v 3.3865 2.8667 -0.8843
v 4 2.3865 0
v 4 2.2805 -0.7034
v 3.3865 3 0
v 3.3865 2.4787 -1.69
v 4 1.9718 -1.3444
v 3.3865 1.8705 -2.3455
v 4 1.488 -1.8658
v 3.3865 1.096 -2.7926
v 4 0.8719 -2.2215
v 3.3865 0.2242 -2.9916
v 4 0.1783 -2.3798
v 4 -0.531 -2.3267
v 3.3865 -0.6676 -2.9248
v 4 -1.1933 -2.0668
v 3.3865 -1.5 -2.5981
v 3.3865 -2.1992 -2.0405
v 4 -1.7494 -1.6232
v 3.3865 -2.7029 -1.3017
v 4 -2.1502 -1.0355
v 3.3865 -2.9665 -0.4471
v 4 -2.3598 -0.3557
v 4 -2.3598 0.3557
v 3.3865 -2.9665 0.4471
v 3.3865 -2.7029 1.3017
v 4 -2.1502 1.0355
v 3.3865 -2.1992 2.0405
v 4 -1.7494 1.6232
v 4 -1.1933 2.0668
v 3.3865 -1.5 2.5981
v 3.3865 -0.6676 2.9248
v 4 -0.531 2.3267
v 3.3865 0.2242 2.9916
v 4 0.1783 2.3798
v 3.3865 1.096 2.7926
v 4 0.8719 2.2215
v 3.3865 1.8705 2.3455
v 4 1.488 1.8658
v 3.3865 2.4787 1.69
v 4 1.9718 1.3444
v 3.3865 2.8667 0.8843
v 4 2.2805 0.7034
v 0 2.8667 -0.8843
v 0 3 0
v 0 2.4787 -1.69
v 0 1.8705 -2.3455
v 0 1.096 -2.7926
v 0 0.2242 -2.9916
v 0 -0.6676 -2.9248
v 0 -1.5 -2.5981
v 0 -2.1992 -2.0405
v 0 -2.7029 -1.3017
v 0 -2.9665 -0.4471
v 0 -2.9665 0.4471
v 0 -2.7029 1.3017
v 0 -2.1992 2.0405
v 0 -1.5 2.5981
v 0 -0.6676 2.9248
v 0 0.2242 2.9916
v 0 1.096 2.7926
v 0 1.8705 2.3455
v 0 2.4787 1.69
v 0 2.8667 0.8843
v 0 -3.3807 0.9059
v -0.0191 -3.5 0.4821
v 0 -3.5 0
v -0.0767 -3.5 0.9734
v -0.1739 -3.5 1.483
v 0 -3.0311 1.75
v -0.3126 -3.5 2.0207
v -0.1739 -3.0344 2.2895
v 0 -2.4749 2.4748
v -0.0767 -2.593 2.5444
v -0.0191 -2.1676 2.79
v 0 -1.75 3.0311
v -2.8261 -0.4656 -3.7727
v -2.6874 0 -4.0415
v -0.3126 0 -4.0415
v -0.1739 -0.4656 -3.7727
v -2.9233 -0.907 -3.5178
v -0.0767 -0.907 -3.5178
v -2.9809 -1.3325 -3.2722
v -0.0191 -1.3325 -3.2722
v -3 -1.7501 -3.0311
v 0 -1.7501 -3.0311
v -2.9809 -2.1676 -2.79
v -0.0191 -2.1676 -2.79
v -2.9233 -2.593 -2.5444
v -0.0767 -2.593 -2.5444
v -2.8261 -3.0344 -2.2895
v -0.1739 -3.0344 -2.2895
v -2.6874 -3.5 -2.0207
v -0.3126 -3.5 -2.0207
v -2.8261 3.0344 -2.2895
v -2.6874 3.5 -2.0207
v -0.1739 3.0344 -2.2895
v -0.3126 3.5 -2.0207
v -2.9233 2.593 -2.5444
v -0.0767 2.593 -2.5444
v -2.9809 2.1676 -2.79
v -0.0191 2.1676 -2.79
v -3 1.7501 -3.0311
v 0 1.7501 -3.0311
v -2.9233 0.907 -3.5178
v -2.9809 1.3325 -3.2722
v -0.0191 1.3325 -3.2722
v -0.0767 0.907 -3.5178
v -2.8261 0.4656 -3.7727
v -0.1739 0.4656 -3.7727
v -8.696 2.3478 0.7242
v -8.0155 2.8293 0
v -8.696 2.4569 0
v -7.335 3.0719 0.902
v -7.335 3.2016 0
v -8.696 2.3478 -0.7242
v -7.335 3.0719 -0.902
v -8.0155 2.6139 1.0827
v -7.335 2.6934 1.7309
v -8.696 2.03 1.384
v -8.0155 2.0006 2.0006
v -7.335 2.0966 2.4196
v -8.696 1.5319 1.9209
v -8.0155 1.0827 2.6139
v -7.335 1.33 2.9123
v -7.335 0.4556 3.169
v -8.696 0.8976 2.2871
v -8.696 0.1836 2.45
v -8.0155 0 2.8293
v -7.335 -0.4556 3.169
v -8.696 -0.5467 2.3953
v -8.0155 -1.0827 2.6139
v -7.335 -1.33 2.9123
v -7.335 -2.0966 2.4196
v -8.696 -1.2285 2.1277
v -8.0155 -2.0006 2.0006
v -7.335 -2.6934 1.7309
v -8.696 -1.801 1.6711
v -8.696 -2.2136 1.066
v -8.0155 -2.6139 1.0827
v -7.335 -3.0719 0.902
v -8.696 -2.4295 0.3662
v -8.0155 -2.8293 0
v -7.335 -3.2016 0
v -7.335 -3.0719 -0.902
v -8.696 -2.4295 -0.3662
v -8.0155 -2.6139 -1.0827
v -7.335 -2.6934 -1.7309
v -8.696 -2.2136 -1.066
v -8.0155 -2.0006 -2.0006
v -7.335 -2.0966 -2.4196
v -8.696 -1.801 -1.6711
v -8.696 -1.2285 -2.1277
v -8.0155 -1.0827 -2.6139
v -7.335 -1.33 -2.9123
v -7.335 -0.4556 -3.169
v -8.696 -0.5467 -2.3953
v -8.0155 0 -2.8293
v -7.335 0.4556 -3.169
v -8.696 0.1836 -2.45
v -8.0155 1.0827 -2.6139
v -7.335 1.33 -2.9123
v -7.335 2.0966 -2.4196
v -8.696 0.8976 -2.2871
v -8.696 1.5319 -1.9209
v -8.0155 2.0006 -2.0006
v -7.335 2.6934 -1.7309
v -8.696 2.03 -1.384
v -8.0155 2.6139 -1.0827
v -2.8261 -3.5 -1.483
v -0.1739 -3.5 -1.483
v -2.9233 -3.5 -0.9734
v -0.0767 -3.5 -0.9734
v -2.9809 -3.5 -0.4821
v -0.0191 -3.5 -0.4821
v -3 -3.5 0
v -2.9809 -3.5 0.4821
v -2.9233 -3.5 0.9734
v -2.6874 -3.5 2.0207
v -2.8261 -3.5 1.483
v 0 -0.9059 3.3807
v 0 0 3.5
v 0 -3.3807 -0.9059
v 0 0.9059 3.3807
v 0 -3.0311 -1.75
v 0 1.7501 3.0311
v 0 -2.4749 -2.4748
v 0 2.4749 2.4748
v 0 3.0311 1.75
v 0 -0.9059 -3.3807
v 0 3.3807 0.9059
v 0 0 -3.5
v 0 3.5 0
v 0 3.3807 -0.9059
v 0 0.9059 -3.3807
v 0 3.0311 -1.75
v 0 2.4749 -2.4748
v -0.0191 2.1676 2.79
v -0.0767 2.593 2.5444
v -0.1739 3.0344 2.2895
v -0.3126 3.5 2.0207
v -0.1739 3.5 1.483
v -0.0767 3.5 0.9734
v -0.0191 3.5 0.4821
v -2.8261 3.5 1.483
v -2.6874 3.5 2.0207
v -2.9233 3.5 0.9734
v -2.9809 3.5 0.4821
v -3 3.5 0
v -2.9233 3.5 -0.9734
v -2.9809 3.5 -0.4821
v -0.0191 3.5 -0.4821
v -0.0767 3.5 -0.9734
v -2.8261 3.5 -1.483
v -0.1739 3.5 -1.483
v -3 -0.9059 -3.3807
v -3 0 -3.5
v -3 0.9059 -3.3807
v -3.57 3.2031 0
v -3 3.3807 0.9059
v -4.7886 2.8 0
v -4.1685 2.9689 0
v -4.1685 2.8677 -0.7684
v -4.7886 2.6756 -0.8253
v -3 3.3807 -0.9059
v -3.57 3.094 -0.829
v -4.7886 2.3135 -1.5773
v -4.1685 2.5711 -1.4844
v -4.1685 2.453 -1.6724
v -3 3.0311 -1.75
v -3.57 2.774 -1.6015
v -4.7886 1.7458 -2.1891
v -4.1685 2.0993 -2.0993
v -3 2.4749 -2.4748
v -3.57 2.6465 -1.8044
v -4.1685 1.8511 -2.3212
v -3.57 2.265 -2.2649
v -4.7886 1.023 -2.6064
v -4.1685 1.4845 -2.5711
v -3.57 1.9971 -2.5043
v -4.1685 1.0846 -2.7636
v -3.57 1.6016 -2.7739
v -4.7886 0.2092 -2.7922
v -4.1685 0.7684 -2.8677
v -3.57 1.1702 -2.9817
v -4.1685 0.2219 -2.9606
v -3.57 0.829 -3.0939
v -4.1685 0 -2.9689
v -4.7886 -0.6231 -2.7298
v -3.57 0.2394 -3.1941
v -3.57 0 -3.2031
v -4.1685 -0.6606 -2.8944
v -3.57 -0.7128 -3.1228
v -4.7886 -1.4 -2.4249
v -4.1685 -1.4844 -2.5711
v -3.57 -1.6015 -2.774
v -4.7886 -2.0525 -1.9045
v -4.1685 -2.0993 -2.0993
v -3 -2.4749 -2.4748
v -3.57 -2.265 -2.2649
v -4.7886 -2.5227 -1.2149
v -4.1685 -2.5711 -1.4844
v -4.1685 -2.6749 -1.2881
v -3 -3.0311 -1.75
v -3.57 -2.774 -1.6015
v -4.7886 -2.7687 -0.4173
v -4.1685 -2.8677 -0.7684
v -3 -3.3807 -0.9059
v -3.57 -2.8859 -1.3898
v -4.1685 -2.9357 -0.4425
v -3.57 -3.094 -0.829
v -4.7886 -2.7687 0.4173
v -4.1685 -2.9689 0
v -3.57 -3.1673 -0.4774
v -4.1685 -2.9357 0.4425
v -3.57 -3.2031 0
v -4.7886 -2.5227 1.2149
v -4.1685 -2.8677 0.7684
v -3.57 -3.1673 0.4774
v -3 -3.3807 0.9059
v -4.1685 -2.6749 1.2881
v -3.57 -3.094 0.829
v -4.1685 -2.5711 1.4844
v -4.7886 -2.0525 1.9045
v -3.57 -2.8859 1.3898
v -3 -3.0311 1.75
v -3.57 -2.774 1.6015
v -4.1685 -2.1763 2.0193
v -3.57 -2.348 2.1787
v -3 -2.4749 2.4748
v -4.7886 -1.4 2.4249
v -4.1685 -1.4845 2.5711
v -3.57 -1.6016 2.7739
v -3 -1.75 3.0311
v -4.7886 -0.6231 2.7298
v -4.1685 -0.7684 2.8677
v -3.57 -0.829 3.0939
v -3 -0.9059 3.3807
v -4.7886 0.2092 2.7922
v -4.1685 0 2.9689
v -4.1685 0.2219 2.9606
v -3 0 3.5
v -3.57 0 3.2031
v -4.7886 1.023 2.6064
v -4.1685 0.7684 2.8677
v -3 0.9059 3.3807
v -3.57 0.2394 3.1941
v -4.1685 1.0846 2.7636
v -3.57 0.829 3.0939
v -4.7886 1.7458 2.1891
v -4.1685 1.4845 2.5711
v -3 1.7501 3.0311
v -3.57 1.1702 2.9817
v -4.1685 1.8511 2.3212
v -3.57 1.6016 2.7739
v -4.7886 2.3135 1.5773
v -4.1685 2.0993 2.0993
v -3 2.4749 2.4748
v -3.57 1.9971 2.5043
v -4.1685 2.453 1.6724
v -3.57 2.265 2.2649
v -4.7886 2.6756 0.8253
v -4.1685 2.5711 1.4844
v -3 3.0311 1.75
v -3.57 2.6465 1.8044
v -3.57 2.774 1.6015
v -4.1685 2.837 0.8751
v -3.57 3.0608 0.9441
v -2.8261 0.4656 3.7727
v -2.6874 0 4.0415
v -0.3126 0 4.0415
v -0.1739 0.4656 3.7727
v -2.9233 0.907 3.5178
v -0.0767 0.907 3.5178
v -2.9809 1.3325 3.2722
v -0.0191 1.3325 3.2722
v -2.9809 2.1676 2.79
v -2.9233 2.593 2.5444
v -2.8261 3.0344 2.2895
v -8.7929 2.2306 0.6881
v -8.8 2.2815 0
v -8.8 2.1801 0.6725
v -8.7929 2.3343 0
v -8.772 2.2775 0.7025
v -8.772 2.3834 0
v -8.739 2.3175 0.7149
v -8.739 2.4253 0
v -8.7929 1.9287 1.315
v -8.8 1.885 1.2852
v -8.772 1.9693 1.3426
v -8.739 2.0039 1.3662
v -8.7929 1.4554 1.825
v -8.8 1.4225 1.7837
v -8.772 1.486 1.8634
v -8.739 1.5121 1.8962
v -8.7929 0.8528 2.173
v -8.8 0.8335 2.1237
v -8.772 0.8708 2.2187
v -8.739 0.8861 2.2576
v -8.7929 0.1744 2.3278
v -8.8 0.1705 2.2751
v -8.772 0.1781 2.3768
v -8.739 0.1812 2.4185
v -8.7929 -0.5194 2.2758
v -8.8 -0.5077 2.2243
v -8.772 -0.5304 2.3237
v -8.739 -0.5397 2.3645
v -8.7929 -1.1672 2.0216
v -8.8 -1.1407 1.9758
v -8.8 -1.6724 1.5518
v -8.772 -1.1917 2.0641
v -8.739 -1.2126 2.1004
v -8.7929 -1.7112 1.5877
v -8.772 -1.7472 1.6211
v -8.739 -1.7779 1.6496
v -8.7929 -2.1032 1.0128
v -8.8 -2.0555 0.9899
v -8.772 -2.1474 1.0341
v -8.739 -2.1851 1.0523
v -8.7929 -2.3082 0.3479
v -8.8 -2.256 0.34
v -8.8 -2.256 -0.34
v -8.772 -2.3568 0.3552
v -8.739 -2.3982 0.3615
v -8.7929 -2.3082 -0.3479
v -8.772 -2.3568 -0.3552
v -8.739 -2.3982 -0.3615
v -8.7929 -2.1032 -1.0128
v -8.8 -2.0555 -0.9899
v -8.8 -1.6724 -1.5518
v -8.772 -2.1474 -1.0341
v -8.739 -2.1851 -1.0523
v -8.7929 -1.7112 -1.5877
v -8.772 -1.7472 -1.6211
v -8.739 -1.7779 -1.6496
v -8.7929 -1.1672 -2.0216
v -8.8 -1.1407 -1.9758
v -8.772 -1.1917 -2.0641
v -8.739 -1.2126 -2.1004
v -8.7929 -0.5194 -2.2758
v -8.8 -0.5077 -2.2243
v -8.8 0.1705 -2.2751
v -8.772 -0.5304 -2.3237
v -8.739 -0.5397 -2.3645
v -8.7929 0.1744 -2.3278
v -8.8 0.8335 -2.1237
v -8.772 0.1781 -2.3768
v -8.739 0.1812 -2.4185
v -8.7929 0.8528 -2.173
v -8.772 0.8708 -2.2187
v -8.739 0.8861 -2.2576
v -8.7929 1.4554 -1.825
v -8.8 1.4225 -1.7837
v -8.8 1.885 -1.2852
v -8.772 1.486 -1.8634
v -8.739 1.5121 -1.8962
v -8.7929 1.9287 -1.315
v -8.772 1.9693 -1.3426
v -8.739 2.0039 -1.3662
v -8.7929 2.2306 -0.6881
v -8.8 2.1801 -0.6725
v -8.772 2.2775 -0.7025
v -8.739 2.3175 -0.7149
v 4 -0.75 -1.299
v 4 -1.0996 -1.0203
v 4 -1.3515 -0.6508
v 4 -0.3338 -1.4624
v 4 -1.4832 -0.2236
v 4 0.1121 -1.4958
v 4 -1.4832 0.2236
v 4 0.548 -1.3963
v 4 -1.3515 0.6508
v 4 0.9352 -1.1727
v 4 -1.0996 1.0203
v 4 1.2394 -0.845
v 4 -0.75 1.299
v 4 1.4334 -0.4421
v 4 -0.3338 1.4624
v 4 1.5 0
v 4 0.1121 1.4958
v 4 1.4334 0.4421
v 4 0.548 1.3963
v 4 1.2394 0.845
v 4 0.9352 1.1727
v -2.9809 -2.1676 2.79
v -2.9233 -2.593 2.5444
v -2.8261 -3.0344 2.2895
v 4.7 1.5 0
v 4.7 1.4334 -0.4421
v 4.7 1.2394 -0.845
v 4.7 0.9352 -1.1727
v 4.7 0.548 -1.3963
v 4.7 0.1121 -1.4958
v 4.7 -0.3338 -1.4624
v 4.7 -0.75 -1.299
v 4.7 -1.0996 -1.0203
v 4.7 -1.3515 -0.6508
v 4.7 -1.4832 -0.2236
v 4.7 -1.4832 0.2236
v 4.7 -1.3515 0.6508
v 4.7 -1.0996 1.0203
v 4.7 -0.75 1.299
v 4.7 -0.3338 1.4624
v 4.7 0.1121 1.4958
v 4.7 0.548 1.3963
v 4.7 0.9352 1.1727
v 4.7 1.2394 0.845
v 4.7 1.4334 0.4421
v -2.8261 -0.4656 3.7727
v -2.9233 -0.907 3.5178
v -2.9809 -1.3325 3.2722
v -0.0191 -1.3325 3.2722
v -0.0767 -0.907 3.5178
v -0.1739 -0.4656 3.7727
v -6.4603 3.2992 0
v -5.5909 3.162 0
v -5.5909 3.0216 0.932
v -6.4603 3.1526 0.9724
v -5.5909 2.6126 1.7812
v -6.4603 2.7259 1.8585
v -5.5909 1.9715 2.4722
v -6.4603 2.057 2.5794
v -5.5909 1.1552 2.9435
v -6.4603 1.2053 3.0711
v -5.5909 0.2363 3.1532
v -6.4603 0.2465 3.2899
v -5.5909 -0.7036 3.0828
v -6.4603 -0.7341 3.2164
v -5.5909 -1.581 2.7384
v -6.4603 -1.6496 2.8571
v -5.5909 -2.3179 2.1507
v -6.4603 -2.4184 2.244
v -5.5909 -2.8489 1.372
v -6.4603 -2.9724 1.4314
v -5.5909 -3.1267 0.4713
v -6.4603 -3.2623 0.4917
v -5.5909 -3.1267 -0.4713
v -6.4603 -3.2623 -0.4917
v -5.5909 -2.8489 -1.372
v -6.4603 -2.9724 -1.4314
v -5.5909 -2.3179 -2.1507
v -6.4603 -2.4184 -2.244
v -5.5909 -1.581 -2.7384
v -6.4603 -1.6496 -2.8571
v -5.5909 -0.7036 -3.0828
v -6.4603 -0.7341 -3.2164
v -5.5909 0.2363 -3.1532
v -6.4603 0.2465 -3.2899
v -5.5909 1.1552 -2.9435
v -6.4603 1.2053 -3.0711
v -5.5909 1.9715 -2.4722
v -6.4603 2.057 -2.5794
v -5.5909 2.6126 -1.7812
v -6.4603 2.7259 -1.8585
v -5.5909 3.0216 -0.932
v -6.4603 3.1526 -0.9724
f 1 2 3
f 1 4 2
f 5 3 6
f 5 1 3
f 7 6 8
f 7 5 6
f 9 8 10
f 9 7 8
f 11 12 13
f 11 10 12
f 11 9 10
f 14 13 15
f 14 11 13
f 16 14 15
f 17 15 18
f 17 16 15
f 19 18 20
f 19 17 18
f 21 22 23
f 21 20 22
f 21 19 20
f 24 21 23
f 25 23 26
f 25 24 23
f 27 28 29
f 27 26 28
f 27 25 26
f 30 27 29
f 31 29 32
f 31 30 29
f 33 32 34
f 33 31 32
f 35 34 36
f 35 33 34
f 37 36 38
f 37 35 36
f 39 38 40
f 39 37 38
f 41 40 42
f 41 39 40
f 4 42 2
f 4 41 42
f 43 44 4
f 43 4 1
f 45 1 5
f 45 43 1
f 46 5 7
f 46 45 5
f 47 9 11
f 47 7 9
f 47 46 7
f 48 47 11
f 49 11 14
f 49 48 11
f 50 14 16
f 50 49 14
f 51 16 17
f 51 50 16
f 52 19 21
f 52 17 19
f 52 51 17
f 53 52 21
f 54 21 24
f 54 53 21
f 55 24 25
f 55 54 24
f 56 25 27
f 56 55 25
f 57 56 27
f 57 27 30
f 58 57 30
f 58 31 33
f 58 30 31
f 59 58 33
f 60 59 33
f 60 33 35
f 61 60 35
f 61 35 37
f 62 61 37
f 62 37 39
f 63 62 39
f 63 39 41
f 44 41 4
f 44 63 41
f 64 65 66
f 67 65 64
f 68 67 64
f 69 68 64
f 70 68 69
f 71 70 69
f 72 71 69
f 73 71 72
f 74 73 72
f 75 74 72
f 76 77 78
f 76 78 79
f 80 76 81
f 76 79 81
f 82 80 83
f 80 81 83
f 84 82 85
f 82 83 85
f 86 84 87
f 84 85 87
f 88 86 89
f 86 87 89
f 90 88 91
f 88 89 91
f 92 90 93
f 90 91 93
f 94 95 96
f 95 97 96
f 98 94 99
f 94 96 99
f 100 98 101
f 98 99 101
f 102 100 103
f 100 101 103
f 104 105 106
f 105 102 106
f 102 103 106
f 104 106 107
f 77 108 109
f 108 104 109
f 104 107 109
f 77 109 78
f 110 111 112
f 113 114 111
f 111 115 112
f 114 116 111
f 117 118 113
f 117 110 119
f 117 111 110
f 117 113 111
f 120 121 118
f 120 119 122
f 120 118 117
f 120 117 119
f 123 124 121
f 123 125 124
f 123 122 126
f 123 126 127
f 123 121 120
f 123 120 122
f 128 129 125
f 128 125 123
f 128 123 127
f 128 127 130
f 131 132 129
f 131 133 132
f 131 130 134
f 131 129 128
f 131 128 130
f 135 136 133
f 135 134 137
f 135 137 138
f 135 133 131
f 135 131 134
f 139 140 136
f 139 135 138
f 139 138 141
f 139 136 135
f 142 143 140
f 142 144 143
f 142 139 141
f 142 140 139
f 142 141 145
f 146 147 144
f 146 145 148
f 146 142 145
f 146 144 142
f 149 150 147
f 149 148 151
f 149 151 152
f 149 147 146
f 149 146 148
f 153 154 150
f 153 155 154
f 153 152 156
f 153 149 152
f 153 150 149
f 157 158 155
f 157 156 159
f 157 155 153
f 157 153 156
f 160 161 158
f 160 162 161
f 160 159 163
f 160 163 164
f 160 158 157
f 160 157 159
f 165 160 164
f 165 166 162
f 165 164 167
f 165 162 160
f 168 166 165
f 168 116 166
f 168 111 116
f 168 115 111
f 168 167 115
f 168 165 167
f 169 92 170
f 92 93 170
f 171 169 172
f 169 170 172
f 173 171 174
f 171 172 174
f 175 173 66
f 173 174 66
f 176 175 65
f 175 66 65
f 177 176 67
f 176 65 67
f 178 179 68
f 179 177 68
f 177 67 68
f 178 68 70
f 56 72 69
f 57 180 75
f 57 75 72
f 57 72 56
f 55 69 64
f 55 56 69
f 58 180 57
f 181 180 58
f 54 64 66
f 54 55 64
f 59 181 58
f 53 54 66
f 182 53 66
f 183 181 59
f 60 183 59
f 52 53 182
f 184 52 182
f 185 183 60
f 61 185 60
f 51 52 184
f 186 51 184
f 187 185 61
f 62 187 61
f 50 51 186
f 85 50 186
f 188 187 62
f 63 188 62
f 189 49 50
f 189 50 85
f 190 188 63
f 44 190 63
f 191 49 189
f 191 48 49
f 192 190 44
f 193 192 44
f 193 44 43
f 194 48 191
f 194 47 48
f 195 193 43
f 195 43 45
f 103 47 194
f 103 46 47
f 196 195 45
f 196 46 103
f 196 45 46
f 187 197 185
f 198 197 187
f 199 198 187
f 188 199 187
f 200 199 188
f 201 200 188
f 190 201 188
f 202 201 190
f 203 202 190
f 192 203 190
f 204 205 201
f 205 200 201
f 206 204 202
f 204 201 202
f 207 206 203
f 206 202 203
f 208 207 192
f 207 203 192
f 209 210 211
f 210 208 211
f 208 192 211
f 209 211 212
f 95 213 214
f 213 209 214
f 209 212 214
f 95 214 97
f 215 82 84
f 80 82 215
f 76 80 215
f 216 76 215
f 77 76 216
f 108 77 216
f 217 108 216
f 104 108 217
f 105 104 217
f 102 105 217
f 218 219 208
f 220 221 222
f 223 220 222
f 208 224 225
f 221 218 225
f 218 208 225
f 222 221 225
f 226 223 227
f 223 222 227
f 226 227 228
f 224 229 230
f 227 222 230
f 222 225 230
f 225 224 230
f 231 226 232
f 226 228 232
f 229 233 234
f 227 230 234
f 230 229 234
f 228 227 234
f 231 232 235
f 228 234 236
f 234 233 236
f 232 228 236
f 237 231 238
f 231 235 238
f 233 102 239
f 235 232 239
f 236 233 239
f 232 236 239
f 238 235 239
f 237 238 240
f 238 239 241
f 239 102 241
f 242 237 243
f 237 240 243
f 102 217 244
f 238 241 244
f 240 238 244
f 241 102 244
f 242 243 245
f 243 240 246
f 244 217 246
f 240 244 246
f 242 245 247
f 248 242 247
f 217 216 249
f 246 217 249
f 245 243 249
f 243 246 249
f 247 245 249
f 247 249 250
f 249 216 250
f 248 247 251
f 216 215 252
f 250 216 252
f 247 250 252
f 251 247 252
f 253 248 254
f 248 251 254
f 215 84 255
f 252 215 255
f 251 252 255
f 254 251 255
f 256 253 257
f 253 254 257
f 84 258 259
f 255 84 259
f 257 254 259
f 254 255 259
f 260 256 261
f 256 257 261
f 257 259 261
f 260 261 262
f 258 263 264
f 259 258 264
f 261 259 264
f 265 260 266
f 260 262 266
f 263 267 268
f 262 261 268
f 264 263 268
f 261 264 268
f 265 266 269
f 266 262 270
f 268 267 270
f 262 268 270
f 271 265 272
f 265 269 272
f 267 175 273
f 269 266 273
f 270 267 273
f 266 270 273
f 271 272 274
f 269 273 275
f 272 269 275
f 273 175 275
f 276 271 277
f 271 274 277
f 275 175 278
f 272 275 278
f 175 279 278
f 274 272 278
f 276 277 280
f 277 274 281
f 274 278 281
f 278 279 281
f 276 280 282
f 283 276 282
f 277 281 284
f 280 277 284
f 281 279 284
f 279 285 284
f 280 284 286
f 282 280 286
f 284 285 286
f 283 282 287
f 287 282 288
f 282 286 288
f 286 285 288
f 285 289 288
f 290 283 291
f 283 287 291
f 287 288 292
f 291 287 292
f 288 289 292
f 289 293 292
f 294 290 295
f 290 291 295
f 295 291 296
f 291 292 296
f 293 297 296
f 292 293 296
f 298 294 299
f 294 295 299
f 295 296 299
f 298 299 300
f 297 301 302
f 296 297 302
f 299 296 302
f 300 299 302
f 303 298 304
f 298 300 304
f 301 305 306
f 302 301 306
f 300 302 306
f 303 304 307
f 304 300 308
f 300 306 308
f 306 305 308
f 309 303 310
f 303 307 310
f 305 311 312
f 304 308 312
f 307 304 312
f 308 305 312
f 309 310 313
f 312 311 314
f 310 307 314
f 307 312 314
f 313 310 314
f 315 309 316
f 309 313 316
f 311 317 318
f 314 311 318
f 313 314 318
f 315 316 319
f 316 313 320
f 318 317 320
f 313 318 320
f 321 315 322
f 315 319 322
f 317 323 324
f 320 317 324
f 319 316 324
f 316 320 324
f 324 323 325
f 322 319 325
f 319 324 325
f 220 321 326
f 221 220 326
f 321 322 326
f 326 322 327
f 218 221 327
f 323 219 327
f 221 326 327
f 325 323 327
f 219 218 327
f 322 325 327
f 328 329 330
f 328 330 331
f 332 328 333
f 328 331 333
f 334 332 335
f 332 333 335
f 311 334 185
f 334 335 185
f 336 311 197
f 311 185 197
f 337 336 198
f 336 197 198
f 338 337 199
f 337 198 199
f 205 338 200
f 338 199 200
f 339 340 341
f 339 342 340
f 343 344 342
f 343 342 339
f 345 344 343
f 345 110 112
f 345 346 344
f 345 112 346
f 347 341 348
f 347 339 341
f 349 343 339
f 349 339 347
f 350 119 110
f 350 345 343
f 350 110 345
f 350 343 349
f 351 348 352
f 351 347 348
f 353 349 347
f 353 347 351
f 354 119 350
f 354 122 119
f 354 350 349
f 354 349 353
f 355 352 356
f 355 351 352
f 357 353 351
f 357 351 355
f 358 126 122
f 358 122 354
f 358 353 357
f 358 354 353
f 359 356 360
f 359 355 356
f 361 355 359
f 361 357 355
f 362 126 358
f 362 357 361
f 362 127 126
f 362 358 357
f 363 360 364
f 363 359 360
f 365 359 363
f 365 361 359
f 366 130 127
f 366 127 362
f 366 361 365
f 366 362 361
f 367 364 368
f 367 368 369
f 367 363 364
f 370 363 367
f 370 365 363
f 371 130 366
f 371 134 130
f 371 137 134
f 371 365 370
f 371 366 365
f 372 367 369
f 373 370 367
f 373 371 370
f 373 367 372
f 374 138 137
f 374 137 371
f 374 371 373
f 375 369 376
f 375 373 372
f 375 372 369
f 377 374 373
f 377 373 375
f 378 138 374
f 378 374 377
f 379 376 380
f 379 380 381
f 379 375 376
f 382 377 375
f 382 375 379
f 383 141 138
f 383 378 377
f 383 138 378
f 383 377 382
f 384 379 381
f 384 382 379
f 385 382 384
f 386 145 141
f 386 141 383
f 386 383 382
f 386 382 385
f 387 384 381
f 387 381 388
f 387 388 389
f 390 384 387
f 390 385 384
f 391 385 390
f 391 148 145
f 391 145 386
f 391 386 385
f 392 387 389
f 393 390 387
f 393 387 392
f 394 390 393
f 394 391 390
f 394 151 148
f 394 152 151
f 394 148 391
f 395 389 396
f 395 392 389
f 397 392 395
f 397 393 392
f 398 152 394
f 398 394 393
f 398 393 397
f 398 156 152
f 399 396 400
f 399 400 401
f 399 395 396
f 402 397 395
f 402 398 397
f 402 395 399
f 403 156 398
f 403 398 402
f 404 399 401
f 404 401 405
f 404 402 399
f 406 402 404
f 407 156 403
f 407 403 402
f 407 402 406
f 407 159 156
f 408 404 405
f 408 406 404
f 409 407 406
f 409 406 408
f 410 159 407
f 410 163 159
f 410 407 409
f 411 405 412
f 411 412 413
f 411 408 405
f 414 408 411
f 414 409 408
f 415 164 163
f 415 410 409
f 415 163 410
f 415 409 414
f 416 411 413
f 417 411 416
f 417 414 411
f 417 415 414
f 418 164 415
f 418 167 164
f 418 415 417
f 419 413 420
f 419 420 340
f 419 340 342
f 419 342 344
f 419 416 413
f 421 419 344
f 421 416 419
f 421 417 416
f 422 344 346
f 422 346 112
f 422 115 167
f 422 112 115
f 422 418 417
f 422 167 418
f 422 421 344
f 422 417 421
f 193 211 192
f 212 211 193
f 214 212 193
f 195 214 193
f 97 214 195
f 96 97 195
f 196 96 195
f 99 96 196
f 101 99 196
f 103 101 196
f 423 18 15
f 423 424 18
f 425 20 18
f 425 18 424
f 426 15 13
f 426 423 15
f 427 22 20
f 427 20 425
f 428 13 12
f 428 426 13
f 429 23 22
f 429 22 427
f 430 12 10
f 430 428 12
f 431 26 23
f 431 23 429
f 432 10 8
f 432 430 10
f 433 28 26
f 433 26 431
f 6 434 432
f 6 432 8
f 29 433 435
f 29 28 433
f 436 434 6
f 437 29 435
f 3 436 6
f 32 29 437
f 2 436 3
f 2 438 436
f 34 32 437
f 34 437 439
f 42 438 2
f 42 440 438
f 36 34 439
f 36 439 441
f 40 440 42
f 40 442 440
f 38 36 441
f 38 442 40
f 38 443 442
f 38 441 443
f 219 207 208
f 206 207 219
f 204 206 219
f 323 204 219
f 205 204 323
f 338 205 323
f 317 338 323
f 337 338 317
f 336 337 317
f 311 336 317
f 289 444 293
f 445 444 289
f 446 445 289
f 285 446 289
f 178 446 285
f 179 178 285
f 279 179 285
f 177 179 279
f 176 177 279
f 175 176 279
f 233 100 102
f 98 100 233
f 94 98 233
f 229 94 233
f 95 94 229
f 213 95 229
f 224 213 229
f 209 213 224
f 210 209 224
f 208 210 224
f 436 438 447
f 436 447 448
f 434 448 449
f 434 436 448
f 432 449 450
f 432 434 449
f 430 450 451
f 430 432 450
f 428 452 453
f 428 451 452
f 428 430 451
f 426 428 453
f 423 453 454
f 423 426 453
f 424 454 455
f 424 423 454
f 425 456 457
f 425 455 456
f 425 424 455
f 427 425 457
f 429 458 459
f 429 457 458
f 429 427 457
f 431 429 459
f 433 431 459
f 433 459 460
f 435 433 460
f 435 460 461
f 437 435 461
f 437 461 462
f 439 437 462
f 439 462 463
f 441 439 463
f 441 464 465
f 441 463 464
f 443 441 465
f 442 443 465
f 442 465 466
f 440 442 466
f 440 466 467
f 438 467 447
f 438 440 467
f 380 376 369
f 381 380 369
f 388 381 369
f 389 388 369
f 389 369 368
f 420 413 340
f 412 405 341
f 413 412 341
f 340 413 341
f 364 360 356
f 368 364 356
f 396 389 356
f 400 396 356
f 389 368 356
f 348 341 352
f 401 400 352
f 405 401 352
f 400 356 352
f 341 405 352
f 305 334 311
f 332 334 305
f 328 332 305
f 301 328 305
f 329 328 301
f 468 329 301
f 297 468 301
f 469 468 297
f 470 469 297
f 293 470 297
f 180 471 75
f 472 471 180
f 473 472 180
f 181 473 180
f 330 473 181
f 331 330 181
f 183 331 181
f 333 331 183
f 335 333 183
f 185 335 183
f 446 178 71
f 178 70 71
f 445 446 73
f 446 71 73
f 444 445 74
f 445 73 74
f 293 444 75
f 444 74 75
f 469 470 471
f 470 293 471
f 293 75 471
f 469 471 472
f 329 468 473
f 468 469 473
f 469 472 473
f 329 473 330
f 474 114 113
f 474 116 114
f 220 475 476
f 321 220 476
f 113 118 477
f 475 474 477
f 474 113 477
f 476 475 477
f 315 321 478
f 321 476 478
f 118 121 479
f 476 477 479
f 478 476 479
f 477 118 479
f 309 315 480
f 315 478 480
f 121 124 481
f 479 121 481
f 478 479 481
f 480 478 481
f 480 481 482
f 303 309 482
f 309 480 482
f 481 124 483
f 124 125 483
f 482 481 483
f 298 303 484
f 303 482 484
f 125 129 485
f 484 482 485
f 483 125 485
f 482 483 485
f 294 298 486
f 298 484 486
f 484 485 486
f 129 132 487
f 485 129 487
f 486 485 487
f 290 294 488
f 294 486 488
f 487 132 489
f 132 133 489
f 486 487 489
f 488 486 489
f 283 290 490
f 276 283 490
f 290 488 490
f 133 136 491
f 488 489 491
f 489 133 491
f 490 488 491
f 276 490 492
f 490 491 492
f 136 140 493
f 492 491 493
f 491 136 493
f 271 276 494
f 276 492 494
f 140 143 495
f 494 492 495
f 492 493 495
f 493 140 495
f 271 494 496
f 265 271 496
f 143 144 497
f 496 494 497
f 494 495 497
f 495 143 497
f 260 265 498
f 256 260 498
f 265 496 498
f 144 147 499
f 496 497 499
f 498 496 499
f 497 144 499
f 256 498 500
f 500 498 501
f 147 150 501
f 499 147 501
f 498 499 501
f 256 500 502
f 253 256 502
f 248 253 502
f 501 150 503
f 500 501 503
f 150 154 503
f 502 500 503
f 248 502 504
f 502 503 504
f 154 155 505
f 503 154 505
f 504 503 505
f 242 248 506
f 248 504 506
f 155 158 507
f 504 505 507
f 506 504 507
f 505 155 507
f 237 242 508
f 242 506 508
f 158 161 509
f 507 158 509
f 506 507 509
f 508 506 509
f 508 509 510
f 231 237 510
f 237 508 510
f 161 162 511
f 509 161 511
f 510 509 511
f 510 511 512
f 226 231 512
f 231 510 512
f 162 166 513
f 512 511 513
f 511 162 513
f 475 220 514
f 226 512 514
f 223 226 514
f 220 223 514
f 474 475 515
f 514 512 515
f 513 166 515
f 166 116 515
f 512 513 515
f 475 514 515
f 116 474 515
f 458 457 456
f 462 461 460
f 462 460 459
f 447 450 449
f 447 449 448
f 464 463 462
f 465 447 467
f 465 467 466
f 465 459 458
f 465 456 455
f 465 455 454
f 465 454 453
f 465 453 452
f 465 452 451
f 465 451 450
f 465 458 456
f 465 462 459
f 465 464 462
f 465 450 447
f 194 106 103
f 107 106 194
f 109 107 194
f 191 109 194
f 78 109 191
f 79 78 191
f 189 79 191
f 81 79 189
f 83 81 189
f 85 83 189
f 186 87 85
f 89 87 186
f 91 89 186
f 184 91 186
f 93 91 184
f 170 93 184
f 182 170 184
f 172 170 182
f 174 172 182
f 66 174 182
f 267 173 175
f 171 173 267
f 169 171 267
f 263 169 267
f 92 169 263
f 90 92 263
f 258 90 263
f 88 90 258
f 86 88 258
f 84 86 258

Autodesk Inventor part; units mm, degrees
ref_plane "YZ Plane" through (0, 0, 0) normal (1, 0, 0) x (0, 1, 0)
ref_plane "XZ Plane" through (0, 0, 0) normal (0, 1, 0) x (-1, 0, 0)
ref_plane "XY Plane" through (0, 0, 0) normal (0, 0, 1) x (1, 0, 0)
sketch "Esquisse1" plane through (0, 0, 0) normal (0, 0, 1) x (1, 0, 0)
  line L0 (-8.8, 0) -> (-8.8, 2.4)
  line L1 (-8.8, 2.4) -> (-7.335, 3.2016)
  line L2 (-8.8, 0) -> (4.7, 0)
  line L3 (4.7, 0) -> (4.7, 1.5)
  line L4 (4.7, 1.5) -> (4, 1.5)
  line L5 (4, 1.5) -> (4, 3)
  line L6 (4, 3) -> (0, 3)
  arc A0 (-4.7886, 2.8) -> (-7.335, 3.2016) centre (-6.535, 0) ccw
  line L7 (-11.5, 0) -> (7.4, 0) projected
  line L8 (0, -1.7331) -> (0, 10.3984) projected
  arc A1 (-4.7886, 2.8) -> (-3, 3.5) centre (-6.0528, 8.6653) ccw
  line L9 (-3, 3.5) -> (0, 3.5)
  line L10 (0, 3.5) -> (0, 3)
  dimension "d0" = 13.5
  dimension "d1" = 5.6
  dimension "d2" = 0.7
  dimension "d3" = 3
  dimension "d4" = 6
  dimension "d5" = 6.6
  dimension "d6" = 4.8
  dimension "d7" = 6
  dimension "d11" = 7
  dimension "d14" = 3
  dimension "d15" = 4
  dimension "d61" = 7.335
  dimension "d62" = 6.5351
revolve "Corps" add sketch "Esquisse1" angle 360 about axis through (-8.8, 0, 0) along (1, 0, 0)
fillet "Congé1" radius 0.2 1 edges at (-8.8, -2.4, 0)
thread "Filetage1" size "M6x1" class "6g" standard "ISO Metric profile" length 3.3866
sketch "Esquisse2" plane through (0, 0, 0) normal (1, 0, 0) x (0, 0, -1)
  circle A0 centre (0, 0) radius 3.5 projected
  line L0 (2.0207, 3.5) -> (4.0415, 0)
  line L1 (4.0415, 0) -> (2.0207, -3.5)
  line L2 (2.0207, -3.5) -> (-2.0207, -3.5)
  line L3 (-2.0207, -3.5) -> (-4.0415, 0)
  line L4 (-4.0415, 0) -> (-2.0207, 3.5)
  line L5 (-2.0207, 3.5) -> (2.0207, 3.5)
extrude "Tête" add sketch "Esquisse2" against normal blind 3 contours A0 L0 L1 | A0 L5 L0 | L1 L2 A0 | A0 L4 L5 | L2 L3 A0 | A0 L3 L4
sketch "Esquisse3" plane through (0, 0, 0) normal (0, 1, 0) x (-1, 0, 0)
  line L0 (2.6874, 4.0415) -> (3, 4.0415)
  line L1 (3, 4.0415) -> (3, 3.5)
  line L2 (3, 3.5) -> (2.6874, 4.0415)
  line L3 (0.3126, 4.0415) -> (0, 4.0415)
  line L4 (0, 4.0415) -> (0, 3.5)
  line L5 (0, 3.5) -> (0.3126, 4.0415)
  line L6 (3.6, 0) -> (-0.6, 0) projected
  line L7 (0, 4.0415) -> (0, 2.0207) projected
  line L8 (0, 4.0415) -> (3, 4.0415) projected
  line L9 (3, 3.0311) -> (3, 4.0415) projected
  dimension "d19" = 3.5
  dimension "d20" = 3.5
  dimension "d21" = 30
  dimension "d22" = 30
revolve "Chanfrein1" cut sketch "Esquisse3" angle 360 about axis through (-10, 0, 0) along (1, 0, 0)
chamfer "Chanfrein2" distance 0.6135 angle 45 1 edges at (4, -3, 0) measured on face at (4, 2.4564, -0.359)
equation "\"d17\" = KOH"
equation "\"d8\" = RR"
equation "\"d9\" = NLG - GAL"
equation "\"d23\" = -0.5 * GD1 + 0.5 * NND"
equation "\"d59\" = -0.5 * GD1 + 0.5 * NND"
equation "\"d0\" = GL"
equation "\"d1\" = KGB2"
equation "\"d2\" = PHH"
equation "\"d3\" = 0.5 * NND"
equation "\"d4\" = NND"
equation "\"d5\" = KR"
equation "\"d6\" = KGB1"
equation "\"d7\" = RBN"
equation "\"d11\" = SW"
equation "\"d14\" = KOH"
equation "\"d15\" = NLG"
equation "\"d19\" = 0.5 * SW"
equation "\"d20\" = 0.5 * SW"
equation "\"NLG\" = 4"
equation "\"GL\" = 13.5"
equation "\"NND\" = 6"
equation "\"KGB1\" = 4.8"
equation "\"KGB2\" = 5.6"
equation "\"VERS\" = 0.8"
equation "\"KR\" = 6.6"
equation "\"RBN\" = 6"
equation "\"SW\" = 7"
equation "\"KOH\" = 3"
equation "\"GAL\" = 0.61345 * PTC"
equation "\"FAWI\" = 45deg"
equation "\"PHH\" = 0.7"
equation "\"GD1\" = THREADDIA - 1.2269 * PTC"
equation "\"RR\" = 0.2"
equation "\"GUL\" = 0.61345 * PTC"
equation "\"DULO\" = 1.5"
equation "\"PTC\" = 1"
equation "\"GEL\" = 4"
equation "\"THREADDIA\" = 6"
equation "\"TOA\" = 30deg"
properties part number "JIS B 1575 - M 6 F" material "Acier doux"
